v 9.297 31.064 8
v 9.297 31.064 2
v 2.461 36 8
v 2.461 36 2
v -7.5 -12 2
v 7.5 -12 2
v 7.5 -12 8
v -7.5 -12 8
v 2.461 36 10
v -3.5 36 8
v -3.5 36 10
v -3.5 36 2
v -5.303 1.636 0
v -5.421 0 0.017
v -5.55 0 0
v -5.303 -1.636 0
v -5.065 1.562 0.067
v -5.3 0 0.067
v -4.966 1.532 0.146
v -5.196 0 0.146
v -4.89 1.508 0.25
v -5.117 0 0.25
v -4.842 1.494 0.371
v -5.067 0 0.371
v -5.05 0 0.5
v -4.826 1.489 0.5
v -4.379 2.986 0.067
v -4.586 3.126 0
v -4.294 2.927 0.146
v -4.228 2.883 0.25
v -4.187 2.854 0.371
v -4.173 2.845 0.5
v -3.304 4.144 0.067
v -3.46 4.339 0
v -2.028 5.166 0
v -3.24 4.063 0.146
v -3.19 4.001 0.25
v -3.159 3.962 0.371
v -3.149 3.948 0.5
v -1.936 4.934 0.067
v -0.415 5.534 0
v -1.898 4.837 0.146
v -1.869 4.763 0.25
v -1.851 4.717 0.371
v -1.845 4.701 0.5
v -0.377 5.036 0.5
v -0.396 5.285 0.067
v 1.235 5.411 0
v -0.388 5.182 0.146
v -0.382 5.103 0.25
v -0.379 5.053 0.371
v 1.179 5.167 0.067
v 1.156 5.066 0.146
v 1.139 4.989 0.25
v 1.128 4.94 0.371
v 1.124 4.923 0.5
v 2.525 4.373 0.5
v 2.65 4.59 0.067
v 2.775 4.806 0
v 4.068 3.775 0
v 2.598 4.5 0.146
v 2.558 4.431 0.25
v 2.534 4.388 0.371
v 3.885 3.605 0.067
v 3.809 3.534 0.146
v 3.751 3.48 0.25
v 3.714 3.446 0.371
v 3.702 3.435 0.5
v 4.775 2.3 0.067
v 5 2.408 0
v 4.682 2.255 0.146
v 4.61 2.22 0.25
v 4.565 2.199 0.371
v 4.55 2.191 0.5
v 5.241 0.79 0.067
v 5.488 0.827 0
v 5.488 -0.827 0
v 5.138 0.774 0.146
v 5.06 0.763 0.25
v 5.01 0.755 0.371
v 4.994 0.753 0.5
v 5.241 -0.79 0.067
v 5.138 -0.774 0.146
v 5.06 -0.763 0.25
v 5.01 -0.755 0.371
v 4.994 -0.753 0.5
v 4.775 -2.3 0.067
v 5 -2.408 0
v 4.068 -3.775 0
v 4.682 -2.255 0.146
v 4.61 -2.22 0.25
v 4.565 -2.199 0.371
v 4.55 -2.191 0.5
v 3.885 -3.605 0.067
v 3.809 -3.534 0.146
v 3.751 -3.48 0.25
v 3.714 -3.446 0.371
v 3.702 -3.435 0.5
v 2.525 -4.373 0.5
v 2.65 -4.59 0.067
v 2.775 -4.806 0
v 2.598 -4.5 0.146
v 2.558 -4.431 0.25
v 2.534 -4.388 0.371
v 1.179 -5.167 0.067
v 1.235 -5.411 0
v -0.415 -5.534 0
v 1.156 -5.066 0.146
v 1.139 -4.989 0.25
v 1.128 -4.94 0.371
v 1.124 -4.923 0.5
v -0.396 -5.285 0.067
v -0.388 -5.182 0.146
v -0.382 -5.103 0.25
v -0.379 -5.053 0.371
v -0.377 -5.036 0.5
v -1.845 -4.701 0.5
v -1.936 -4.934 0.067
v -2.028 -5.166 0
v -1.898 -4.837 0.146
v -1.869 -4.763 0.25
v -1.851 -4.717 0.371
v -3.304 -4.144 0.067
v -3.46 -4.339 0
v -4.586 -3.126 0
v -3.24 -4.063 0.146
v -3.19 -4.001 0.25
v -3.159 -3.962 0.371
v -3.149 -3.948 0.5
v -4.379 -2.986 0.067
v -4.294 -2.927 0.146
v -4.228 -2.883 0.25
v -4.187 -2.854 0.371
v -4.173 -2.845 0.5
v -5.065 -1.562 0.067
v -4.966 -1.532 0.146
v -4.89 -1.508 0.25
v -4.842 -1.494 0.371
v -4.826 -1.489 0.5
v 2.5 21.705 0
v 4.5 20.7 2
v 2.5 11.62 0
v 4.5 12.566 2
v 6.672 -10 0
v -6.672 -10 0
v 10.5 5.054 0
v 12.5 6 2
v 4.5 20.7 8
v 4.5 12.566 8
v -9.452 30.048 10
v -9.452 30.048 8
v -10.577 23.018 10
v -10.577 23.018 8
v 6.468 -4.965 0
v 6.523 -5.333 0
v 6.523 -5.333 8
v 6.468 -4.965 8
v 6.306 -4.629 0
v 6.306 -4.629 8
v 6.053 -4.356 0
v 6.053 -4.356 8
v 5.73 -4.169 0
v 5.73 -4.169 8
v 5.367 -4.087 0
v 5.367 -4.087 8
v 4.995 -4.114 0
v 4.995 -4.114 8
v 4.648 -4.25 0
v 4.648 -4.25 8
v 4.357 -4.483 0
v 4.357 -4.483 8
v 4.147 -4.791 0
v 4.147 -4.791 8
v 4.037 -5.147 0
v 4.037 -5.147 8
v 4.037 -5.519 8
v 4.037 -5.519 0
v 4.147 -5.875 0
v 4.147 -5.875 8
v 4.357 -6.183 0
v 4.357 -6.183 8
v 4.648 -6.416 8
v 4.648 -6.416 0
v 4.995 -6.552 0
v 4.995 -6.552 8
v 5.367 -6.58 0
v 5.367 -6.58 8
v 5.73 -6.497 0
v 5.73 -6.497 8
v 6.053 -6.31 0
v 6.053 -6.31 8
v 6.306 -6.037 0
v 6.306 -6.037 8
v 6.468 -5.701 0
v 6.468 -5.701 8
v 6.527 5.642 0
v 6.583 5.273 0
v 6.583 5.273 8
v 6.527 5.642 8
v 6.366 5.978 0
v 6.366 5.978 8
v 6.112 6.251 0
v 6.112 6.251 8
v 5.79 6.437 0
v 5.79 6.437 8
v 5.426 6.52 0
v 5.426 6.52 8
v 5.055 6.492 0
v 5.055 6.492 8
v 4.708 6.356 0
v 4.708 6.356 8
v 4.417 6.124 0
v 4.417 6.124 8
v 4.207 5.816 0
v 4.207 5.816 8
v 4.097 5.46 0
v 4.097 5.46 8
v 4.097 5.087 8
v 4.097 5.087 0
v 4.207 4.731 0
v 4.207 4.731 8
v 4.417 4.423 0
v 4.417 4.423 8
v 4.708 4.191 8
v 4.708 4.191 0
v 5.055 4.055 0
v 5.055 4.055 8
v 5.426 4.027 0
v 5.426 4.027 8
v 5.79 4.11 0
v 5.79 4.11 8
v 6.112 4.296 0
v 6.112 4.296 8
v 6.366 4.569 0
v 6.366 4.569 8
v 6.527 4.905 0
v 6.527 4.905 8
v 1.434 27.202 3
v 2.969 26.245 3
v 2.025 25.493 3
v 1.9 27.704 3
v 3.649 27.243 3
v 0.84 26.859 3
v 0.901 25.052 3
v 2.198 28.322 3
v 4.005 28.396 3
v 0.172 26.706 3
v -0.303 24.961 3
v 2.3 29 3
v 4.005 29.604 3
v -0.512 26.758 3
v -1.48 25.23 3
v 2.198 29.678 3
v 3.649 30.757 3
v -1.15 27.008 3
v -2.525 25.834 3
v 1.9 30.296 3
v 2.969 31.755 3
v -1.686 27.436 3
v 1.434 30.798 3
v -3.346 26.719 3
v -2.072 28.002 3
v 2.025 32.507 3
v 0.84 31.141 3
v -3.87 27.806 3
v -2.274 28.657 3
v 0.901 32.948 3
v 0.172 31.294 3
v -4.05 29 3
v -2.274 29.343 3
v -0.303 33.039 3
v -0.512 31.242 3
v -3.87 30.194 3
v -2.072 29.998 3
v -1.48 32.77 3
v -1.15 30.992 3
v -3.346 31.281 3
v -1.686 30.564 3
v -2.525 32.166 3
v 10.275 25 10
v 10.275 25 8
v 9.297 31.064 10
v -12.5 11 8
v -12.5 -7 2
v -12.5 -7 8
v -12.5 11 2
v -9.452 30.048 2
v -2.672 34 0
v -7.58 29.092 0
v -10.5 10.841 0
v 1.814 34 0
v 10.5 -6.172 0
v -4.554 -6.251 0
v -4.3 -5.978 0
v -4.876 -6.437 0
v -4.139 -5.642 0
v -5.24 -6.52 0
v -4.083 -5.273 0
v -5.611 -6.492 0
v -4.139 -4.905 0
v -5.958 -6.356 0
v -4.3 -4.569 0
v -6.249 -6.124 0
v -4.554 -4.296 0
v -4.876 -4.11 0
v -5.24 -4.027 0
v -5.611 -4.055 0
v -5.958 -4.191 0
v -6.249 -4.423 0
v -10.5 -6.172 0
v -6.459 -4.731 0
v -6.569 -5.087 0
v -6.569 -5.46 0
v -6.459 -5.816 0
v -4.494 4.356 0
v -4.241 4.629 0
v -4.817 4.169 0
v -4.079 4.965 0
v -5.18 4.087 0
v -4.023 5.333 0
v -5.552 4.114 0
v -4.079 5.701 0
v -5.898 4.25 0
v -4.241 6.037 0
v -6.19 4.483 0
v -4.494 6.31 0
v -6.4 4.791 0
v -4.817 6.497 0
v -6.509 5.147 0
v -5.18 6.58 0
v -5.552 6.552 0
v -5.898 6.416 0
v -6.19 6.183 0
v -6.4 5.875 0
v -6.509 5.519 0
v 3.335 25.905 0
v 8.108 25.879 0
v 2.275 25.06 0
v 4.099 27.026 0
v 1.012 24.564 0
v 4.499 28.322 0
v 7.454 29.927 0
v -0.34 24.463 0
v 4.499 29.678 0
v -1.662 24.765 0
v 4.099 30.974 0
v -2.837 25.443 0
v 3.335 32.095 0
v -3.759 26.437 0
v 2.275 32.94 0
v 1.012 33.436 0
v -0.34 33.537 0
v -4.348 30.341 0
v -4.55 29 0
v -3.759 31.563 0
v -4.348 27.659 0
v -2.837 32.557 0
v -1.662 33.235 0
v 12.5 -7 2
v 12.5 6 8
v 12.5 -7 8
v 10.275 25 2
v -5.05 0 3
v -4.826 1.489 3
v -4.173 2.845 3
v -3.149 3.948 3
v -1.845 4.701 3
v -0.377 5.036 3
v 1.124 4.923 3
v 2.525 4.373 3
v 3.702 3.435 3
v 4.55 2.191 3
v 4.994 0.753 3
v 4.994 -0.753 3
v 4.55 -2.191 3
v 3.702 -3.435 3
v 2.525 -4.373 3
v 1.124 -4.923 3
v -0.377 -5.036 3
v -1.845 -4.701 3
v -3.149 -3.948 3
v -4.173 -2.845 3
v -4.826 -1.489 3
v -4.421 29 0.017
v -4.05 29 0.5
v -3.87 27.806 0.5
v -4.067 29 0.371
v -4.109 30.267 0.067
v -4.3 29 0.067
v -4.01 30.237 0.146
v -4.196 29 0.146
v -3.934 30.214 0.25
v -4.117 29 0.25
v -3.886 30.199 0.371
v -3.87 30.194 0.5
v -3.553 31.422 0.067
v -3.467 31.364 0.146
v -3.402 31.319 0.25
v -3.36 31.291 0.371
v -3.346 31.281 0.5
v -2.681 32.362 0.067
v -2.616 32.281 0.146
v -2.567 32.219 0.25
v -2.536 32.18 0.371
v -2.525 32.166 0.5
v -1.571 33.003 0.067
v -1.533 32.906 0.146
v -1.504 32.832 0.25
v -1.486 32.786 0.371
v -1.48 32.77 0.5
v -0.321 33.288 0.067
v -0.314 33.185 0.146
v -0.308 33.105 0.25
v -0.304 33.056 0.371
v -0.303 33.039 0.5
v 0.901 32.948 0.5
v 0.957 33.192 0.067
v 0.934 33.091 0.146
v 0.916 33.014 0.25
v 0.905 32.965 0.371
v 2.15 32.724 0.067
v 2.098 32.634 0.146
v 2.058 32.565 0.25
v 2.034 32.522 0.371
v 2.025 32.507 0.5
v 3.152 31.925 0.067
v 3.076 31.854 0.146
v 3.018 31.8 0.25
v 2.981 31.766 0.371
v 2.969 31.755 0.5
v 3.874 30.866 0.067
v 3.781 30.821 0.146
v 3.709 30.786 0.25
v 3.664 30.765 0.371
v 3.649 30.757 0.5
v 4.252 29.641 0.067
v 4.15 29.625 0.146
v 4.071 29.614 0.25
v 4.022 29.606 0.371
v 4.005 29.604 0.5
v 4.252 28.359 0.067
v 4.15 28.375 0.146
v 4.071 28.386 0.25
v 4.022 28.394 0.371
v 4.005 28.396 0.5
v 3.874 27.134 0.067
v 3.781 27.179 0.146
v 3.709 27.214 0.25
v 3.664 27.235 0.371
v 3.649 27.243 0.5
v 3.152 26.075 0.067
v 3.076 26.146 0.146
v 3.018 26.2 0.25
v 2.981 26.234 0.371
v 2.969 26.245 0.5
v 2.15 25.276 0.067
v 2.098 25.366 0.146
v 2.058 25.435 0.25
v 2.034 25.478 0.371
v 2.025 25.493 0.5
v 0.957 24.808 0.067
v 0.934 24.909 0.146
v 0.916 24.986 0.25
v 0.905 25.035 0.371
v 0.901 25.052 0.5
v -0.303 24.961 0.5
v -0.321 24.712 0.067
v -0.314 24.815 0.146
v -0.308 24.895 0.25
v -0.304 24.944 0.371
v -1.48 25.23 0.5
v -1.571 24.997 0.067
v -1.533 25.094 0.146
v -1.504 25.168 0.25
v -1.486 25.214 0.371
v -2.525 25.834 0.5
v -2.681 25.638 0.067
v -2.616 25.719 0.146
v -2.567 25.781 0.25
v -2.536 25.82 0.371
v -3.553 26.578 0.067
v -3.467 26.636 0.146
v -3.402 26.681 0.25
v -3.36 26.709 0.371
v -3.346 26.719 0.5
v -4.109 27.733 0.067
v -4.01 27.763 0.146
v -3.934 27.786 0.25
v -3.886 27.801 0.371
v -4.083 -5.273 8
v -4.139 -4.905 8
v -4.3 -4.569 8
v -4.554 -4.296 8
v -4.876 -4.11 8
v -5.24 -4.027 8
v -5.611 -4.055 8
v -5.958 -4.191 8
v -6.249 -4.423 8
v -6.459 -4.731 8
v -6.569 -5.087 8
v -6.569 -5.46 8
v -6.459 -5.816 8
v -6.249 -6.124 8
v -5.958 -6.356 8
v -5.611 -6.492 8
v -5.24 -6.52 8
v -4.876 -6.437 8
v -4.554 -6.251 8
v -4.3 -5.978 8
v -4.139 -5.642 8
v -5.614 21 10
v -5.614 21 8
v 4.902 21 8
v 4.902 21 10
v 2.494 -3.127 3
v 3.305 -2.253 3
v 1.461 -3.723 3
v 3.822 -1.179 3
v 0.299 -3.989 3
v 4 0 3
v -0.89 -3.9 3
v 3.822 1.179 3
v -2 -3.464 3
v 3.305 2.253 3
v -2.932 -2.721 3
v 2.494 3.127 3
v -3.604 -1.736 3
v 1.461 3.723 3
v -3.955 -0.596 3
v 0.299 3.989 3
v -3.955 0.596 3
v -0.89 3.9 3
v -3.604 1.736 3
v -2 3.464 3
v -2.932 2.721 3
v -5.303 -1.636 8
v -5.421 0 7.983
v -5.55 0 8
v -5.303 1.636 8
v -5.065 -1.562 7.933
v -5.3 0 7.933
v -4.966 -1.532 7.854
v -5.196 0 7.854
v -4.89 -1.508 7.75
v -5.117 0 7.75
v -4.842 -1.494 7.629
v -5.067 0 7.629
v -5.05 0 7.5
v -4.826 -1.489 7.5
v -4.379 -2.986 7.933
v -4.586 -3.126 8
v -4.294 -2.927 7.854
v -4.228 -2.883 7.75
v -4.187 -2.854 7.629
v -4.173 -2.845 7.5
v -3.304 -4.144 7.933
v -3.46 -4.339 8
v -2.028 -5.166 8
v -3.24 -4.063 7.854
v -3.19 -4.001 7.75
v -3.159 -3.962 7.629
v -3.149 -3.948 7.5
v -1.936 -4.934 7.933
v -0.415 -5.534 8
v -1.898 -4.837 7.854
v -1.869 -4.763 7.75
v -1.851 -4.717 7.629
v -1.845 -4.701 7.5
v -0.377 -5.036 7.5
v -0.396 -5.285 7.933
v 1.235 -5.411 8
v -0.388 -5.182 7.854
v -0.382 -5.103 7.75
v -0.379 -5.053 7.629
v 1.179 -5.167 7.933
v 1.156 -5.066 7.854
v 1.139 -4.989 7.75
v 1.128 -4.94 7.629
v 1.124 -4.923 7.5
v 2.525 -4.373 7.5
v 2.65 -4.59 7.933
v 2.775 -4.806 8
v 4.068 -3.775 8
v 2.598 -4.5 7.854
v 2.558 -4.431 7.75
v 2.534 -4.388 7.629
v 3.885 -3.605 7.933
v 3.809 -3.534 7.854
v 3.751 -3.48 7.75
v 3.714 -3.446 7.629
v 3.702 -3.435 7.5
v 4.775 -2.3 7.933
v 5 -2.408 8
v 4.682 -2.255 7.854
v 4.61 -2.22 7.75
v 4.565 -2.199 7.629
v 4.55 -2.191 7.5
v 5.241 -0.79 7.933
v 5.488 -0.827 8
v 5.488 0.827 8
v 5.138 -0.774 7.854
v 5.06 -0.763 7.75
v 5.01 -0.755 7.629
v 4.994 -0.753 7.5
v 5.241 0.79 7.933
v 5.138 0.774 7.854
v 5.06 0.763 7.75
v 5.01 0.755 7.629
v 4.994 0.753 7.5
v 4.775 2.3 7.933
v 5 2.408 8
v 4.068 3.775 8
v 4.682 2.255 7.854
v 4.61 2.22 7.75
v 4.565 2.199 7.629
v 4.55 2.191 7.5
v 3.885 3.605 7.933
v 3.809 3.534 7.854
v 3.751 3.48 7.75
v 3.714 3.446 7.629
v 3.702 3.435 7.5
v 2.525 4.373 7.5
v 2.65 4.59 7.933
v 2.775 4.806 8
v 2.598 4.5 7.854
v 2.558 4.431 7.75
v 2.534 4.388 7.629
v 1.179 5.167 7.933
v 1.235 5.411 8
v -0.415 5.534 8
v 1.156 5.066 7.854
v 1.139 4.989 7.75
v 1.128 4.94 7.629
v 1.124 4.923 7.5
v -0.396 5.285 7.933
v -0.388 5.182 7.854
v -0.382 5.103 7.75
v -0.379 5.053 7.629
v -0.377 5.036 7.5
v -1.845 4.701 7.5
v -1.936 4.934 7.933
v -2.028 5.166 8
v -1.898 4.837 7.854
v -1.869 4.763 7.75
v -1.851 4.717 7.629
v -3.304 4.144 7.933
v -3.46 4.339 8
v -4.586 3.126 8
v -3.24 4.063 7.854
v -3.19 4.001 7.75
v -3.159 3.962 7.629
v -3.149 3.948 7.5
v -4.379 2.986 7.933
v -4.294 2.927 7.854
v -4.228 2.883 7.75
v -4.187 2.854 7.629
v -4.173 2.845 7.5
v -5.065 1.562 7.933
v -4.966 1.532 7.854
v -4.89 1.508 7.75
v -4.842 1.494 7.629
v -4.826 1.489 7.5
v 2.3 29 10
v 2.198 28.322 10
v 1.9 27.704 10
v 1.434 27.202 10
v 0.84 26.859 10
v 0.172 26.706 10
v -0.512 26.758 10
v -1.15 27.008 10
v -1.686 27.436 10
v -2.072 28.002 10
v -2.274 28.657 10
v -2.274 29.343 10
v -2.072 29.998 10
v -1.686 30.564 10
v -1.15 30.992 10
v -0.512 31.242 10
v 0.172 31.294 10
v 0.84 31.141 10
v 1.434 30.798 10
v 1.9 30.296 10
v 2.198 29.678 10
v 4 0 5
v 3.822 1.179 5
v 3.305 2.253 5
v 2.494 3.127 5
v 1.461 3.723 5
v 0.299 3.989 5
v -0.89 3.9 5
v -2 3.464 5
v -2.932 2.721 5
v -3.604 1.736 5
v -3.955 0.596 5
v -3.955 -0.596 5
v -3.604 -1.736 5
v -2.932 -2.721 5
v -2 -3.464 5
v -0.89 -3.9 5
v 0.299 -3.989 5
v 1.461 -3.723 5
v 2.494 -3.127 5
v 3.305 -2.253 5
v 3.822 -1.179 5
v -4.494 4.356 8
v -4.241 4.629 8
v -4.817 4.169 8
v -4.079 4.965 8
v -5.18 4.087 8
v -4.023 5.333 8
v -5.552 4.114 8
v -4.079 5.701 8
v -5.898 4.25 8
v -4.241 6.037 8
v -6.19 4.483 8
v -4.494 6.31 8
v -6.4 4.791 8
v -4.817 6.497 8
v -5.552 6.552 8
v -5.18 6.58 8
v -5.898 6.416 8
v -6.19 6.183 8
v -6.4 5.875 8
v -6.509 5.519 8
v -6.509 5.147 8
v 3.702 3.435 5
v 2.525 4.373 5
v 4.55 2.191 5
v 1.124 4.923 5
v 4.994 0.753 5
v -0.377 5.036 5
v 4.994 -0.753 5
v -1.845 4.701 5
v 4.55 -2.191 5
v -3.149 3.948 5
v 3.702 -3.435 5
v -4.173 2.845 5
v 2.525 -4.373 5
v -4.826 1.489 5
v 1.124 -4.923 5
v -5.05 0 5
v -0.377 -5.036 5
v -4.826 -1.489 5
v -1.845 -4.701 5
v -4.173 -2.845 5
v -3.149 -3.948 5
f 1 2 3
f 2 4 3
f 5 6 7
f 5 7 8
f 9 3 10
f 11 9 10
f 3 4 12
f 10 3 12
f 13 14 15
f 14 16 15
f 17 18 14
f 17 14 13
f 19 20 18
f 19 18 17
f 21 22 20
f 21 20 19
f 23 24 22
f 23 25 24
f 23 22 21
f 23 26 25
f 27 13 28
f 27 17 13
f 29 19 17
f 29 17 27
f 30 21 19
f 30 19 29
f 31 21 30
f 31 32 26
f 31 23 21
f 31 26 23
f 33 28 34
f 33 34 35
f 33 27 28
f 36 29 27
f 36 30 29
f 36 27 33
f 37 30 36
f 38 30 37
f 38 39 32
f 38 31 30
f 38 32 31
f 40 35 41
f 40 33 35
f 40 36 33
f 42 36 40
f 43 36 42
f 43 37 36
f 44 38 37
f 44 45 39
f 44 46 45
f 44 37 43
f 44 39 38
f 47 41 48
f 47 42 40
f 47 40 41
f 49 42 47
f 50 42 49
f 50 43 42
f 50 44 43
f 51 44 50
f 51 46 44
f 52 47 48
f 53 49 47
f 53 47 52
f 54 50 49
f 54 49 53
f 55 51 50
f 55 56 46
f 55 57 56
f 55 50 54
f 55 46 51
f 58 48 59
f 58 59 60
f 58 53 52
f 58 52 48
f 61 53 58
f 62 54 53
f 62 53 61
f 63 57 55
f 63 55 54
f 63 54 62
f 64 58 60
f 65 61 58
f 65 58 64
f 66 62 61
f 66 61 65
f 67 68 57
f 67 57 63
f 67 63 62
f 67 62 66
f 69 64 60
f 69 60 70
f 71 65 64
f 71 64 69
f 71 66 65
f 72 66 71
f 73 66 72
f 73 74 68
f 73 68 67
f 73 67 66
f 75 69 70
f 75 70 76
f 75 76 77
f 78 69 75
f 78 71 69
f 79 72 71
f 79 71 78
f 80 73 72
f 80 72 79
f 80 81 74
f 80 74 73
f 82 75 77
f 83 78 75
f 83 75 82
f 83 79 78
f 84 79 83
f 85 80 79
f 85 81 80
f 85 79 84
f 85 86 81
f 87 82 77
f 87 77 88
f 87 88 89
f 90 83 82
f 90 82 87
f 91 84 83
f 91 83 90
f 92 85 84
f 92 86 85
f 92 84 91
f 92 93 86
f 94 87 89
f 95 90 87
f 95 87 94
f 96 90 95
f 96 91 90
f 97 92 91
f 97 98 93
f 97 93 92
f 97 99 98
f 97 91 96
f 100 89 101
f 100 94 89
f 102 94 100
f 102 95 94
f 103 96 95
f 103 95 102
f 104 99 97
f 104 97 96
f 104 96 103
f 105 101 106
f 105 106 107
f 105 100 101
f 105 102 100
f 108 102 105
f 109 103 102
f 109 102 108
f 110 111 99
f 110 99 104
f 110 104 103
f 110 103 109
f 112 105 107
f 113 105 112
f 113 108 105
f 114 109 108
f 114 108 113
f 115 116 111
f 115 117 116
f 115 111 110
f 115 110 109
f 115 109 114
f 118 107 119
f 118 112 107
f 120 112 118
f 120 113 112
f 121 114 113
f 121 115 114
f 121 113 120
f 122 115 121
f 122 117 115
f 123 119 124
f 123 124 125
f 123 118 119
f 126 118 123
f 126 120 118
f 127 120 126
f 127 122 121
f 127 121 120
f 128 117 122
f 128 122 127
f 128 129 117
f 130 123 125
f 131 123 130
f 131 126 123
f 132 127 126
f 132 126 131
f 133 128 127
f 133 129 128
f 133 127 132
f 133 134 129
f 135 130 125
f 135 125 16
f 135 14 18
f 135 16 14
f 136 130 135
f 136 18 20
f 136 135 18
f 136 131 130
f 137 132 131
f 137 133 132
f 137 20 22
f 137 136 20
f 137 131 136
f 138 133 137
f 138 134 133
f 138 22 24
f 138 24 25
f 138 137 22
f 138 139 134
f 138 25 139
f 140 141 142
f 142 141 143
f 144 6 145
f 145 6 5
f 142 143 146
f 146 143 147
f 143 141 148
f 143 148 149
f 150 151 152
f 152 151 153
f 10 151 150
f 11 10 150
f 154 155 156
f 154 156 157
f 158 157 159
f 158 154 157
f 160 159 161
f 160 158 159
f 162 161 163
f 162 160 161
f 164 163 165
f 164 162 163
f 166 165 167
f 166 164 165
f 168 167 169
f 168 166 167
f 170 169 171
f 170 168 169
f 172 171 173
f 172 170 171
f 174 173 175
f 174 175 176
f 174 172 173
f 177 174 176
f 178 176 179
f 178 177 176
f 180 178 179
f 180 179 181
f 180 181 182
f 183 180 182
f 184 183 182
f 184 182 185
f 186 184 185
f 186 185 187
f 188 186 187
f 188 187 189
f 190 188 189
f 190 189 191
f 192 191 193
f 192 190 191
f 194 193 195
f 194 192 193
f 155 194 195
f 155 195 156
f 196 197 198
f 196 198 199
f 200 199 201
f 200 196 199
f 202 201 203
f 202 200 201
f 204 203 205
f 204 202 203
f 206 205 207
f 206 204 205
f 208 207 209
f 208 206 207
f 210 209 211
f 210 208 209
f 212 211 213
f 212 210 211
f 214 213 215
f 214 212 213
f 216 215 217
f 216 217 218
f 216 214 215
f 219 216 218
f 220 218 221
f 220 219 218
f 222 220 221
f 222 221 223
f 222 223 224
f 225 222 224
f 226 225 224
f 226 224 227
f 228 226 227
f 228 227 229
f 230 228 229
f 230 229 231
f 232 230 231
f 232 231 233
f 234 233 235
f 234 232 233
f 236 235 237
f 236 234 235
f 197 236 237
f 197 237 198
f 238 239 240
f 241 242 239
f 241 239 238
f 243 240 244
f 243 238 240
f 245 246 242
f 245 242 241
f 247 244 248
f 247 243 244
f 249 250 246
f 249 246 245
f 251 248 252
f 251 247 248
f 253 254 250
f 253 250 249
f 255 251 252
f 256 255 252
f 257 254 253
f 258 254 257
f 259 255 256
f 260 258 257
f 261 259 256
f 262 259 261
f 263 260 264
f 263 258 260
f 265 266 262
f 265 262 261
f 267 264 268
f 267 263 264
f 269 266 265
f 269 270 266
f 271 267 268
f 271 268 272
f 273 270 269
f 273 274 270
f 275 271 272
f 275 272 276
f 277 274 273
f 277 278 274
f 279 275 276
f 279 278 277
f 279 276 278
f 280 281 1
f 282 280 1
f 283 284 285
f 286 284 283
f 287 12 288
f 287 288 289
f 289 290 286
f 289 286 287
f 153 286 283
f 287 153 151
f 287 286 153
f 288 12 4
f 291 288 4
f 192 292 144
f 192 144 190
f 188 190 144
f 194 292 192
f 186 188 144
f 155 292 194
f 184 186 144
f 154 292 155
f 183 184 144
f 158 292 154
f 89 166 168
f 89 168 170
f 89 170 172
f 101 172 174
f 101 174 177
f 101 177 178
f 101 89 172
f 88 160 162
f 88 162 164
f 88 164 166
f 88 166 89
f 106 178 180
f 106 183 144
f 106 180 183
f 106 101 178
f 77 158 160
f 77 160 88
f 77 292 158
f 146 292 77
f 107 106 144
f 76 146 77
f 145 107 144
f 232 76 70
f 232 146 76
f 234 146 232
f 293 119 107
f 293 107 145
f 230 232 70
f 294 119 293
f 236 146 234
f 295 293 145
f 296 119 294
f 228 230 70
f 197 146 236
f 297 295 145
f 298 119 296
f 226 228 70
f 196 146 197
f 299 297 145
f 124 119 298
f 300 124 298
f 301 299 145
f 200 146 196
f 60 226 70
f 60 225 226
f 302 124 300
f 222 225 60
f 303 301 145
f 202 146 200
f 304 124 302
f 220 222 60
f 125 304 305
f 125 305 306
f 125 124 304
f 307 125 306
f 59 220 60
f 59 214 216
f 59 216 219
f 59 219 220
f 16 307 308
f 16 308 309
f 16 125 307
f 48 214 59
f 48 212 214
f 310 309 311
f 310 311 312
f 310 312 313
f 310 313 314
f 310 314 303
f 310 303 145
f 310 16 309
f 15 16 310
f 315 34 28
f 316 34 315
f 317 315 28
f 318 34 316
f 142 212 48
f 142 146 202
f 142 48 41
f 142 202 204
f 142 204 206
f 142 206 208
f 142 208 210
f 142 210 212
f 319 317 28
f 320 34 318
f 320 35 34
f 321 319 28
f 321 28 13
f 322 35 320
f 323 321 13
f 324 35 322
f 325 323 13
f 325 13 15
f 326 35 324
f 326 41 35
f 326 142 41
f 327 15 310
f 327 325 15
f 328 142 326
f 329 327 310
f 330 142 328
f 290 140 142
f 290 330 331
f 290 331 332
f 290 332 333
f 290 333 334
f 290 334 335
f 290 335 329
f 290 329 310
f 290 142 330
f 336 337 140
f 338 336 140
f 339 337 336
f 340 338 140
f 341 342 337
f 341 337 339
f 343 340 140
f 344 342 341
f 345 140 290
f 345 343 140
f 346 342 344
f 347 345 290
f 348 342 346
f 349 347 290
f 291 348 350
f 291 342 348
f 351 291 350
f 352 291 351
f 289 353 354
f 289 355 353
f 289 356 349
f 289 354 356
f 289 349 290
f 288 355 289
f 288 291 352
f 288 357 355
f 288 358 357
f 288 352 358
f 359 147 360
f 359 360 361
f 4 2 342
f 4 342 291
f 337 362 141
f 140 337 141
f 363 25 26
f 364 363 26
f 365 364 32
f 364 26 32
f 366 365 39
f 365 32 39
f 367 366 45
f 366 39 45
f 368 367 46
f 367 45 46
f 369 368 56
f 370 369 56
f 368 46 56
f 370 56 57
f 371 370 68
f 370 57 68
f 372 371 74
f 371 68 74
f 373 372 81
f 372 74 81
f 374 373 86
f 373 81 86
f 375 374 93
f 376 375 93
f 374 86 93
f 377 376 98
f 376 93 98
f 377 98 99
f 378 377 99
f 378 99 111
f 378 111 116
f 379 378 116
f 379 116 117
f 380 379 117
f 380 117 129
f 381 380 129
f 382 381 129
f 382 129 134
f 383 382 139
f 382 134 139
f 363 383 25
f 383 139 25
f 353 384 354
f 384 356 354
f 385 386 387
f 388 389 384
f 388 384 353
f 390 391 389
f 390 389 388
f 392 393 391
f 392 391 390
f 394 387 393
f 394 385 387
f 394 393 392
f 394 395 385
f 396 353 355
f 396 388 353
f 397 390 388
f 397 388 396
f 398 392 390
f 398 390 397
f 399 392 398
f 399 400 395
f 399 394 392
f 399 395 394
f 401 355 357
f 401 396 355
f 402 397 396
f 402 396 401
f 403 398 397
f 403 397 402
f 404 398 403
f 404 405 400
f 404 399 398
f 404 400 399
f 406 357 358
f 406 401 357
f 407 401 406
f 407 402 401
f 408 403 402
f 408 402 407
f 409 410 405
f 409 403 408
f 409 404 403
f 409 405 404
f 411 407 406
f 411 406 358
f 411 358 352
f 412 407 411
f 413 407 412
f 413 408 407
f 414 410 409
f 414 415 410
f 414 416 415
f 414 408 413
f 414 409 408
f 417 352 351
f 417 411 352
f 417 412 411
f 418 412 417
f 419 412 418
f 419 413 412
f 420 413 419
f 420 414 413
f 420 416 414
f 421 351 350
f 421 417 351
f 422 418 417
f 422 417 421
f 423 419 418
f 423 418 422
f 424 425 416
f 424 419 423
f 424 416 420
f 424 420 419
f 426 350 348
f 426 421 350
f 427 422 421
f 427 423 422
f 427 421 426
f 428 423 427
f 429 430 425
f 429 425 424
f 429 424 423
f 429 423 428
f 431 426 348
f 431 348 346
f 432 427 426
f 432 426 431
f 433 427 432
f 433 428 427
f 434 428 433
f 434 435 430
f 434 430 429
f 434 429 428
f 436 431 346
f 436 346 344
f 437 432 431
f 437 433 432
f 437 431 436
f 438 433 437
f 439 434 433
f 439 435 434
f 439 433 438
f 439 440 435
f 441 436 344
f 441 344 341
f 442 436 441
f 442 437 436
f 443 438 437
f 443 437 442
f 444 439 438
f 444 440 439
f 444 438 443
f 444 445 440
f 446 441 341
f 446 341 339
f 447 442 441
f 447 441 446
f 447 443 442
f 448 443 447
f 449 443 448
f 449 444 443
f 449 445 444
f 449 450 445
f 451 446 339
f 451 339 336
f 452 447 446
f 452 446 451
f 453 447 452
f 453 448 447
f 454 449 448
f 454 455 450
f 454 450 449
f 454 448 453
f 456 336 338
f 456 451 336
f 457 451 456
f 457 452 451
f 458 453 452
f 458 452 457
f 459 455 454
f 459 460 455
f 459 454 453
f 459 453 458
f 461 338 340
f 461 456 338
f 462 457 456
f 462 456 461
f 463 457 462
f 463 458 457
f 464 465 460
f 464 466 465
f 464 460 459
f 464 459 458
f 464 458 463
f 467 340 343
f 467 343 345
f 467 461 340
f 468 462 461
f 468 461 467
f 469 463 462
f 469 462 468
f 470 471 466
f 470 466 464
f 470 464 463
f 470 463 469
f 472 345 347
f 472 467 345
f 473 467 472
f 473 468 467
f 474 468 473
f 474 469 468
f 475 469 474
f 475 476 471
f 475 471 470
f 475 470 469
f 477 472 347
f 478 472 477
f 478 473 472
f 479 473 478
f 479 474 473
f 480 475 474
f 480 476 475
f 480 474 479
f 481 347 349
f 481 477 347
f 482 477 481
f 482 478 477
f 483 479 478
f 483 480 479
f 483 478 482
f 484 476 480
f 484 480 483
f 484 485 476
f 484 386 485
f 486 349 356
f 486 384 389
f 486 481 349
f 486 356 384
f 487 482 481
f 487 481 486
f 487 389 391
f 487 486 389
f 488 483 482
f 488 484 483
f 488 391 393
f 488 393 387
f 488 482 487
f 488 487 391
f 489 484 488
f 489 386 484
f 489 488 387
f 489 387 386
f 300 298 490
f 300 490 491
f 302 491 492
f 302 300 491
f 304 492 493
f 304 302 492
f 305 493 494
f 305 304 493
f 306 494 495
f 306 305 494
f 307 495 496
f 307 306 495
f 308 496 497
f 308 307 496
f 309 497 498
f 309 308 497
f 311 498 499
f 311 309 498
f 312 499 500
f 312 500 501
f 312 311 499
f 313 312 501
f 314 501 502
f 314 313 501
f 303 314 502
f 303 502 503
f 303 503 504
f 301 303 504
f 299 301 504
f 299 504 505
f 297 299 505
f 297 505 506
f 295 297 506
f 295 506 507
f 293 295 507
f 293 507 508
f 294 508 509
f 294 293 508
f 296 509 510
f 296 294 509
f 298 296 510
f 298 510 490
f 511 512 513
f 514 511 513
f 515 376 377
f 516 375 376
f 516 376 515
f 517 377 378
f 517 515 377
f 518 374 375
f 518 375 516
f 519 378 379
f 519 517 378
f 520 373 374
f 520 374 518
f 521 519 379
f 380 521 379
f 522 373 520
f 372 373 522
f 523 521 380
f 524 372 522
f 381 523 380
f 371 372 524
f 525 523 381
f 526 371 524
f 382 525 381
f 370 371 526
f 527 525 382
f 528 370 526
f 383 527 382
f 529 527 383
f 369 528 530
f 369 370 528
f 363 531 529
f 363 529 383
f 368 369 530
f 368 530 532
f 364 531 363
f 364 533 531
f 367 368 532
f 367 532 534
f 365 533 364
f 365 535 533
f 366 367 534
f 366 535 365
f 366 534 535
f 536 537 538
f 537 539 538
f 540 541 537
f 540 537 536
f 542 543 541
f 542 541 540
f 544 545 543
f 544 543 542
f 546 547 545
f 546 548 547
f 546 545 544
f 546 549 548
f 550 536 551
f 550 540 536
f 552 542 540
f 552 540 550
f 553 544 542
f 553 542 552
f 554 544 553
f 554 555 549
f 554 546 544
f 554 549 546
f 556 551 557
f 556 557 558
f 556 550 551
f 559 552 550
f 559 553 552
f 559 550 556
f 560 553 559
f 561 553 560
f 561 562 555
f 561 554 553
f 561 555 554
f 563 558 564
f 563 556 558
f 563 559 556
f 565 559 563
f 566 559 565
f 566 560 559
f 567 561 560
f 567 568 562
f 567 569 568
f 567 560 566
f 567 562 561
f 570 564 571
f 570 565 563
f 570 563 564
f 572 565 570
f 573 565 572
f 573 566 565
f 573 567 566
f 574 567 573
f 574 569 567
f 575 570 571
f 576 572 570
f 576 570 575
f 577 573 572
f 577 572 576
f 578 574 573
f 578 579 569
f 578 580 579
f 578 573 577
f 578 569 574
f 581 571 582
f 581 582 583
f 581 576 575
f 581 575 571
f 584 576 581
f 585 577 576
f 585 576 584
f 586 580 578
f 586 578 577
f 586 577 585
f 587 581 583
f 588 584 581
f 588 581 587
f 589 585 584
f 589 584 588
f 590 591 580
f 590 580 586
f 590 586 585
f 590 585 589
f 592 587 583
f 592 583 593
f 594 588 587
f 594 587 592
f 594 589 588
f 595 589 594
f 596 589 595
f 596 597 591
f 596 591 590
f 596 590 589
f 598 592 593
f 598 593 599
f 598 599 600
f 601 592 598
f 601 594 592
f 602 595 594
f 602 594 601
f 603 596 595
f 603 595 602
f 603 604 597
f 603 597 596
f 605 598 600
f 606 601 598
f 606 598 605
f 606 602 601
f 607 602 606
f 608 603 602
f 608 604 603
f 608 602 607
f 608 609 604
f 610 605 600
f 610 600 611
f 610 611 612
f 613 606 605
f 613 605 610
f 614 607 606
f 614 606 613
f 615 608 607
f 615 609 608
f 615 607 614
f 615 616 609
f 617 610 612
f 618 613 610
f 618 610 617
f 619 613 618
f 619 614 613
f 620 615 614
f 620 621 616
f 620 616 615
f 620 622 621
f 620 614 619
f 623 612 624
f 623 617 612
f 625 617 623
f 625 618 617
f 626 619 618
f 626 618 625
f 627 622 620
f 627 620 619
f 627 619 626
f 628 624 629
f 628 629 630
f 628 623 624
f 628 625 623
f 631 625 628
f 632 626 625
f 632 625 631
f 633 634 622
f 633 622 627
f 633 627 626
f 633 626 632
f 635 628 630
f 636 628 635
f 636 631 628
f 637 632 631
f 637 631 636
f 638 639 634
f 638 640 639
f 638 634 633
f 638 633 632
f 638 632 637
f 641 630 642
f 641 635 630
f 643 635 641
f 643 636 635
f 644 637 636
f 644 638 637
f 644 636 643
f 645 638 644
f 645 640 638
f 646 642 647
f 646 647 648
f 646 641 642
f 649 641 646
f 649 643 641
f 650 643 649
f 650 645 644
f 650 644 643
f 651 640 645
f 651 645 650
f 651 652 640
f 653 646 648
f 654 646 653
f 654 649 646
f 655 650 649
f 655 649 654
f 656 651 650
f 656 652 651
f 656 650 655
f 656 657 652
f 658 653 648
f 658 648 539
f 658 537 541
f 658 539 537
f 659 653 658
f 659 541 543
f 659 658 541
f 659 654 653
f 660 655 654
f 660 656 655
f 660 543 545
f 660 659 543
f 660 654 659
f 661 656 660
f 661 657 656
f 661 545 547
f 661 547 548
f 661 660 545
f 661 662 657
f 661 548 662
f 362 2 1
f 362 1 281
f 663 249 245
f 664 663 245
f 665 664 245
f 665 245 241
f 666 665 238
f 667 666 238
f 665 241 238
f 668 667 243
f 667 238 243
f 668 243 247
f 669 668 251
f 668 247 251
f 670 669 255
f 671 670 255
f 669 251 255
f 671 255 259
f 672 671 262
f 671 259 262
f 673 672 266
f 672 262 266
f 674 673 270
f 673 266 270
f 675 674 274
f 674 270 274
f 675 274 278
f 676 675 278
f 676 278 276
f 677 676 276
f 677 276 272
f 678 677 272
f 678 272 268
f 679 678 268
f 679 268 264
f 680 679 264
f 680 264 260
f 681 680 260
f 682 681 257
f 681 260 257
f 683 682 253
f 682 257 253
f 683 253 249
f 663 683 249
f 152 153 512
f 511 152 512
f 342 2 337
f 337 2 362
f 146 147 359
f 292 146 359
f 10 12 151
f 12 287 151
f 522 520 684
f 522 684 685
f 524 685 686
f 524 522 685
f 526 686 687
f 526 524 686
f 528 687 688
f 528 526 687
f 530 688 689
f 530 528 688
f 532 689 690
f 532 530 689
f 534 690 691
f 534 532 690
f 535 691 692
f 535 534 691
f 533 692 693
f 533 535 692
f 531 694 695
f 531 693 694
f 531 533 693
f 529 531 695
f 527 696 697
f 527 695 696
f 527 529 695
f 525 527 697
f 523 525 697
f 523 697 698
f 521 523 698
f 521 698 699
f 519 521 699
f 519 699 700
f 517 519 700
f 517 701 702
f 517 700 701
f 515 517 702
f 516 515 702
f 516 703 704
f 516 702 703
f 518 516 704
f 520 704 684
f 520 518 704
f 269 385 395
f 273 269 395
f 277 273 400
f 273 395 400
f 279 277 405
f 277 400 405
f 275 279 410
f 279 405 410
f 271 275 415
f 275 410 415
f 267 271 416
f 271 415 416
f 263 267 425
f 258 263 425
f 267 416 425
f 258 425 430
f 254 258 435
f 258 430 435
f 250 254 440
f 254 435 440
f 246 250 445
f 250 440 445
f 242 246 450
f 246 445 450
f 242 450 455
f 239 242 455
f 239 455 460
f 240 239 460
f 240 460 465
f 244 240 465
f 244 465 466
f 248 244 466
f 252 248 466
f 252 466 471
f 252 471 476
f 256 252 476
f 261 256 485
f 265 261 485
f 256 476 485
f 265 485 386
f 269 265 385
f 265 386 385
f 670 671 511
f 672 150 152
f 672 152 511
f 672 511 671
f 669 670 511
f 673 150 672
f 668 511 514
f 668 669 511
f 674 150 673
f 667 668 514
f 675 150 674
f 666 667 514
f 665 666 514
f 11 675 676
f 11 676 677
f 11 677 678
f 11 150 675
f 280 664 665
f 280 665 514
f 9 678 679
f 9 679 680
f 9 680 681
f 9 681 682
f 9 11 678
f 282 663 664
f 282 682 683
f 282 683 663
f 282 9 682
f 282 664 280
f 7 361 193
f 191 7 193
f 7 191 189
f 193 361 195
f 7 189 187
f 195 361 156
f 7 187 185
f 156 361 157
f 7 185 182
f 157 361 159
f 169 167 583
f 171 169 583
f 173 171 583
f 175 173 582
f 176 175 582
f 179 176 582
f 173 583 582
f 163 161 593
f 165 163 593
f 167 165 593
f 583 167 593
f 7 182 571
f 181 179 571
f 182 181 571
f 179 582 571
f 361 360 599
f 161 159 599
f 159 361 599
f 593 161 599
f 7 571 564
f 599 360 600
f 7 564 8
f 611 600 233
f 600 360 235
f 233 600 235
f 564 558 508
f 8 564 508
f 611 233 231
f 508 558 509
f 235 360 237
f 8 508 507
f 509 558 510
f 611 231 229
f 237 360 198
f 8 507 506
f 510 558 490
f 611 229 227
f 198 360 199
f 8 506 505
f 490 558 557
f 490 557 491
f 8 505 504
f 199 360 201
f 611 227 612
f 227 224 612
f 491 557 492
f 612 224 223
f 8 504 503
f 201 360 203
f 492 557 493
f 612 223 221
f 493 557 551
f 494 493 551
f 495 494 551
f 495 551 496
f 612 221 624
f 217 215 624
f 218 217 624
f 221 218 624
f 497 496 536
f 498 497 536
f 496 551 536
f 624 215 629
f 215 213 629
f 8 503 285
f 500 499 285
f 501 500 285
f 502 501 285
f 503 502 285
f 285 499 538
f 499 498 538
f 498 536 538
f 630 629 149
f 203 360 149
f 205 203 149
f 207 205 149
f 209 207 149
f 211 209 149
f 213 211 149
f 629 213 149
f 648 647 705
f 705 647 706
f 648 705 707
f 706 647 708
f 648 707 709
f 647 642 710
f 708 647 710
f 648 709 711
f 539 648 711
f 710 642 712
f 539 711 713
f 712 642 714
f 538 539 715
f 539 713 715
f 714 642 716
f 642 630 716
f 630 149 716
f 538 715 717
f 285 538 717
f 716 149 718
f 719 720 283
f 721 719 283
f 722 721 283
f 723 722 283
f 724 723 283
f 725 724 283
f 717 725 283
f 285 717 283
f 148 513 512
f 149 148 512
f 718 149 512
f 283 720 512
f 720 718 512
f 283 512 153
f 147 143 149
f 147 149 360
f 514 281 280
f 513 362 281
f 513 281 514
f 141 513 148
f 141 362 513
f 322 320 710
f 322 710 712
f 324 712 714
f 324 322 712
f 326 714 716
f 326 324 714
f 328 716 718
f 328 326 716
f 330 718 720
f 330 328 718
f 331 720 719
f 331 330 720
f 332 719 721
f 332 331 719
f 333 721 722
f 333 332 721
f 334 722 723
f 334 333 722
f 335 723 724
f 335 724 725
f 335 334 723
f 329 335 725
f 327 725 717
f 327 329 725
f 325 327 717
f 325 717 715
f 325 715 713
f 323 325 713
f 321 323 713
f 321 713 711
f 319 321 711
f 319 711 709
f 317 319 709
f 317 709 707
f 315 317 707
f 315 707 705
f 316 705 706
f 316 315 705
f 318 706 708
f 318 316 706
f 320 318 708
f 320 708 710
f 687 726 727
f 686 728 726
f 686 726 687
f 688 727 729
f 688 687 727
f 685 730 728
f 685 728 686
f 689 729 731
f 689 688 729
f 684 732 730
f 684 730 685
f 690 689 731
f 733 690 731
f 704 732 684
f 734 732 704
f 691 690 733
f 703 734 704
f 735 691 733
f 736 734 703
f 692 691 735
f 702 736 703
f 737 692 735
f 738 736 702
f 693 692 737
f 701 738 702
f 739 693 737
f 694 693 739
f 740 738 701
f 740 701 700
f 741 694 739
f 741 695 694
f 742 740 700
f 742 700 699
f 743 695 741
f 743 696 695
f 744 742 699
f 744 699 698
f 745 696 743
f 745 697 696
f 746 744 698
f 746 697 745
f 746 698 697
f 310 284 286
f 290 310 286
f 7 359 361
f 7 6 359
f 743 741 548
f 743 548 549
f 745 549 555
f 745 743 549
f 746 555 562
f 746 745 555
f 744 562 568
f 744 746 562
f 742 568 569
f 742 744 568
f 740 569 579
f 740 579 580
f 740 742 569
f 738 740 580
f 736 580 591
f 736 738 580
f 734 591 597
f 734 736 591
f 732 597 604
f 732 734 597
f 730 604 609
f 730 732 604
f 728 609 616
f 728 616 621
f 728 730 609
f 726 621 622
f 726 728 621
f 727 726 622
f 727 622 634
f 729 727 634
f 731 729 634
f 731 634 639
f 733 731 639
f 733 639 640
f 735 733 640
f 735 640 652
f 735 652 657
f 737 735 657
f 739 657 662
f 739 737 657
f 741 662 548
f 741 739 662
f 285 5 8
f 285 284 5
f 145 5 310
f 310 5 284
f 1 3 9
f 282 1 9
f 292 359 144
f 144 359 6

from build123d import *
from OCP.BRepFilletAPI import BRepFilletAPI_MakeChamfer

# Parameters (mm, degrees)
SKETCH_1_R          = 1.25
SKETCH_1_R_2        = 4
SKETCH_1_R_3        = 2.3
EXTRUDE_2_DEPTH     = 8
CHAMFER_1_SIZE      = 5
EXTRUDE_3_DEPTH     = 2
SKETCH_3_R          = 2.3
CUT_EXTRUDE_1_DEPTH = 7
CUT_EXTRUDE_2_DEPTH = 10
CHAMFER_2_SIZE      = 5
CHAMFER_2_SIZE2     = 6.028089953
CHAMFER_2_SIZE2_2   = 6.039479554
CHAMFER_3_SIZE      = 2
SKETCH_5_R          = 5.05
CUT_EXTRUDE_3_DEPTH = 3
CUT_EXTRUDE_START   = -3
SKETCH_6_R          = 5.05
CUT_EXTRUDE_4_DEPTH = 3
FILLET_1_R          = 0.5
SKETCH_7_R          = 4.05
CUT_EXTRUDE_5_DEPTH = 3
FILLET_2_R          = 0.5


with BuildPart() as part:
    # 草图1 → 凸台-拉伸2 (new body)
    with BuildSketch(Plane.XY):
        Polygon((8.5, 36), (12.5, 11.216882722), (12.5, -12), (-12.5, -12), (-12.5, 11), (-8.5, 36), align=None)
        with Locations((-5.273420283, 5.333014019)):
            Circle(SKETCH_1_R, mode=Mode.SUBTRACT)
        with Locations((5.333014019, 5.273420283)):
            Circle(SKETCH_1_R, mode=Mode.SUBTRACT)
        with Locations((5.273420283, -5.333014019)):
            Circle(SKETCH_1_R, mode=Mode.SUBTRACT)
        with Locations((-5.333014019, -5.273420283)):
            Circle(SKETCH_1_R, mode=Mode.SUBTRACT)
        Circle(SKETCH_1_R_2, mode=Mode.SUBTRACT)
        with Locations((0, 29)):
            Circle(SKETCH_1_R_3, mode=Mode.SUBTRACT)
    extrude(amount=EXTRUDE_2_DEPTH)

    # 倒角1
    chamfer_1_edges = [part.edges().sort_by_distance(p)[0] for p in [
        (12.5, -12, 4),
        (-12.5, -12, 4),
    ]]
    chamfer(chamfer_1_edges, length=CHAMFER_1_SIZE)

    # 草图2 → 凸台-拉伸3 (add)
    with BuildSketch(Plane.XY.offset(8)):
        Polygon((-10.577137485, 23.017890722), (-5.61376382, 21), (5.631941325, 21), (10.595314989, 23.017890722), (8.5, 36), (-8.5, 36), align=None)
    extrude(amount=EXTRUDE_3_DEPTH)

    # 草图3 → 切除-拉伸1 (cut)
    with BuildSketch(Plane(origin=(0, 0, 8), x_dir=(-1, 0, 0), z_dir=(0, 0, -1))):
        with Locations(Location((0, 29, 0), (0, 0, 180))):
            Circle(SKETCH_3_R)
    extrude(amount=-CUT_EXTRUDE_1_DEPTH, mode=Mode.SUBTRACT)

    # 草图4 → 切除-拉伸2 (cut)
    with BuildSketch(Plane(origin=(0, 0, 0), x_dir=(-1, 0, 0), z_dir=(0, 0, -1))):
        Polygon((-10.275402162, 25), (-4.5, 20.700412405), (-4.5, 12.565758544), (-12.5, 6), (-12.5, 11.216882722), align=None)
    extrude(amount=-CUT_EXTRUDE_2_DEPTH, mode=Mode.SUBTRACT)

    # 倒角2: one chamfer whose edges measure the first distance from different faces: ONE call of the kernel's chamfer builder (chamfer() names one face for all edges)
    chamfer_2_edges_1 = [part.edges().sort_by_distance(p)[0] for p in [
        (-8.5, 36, 5),
    ]]
    chamfer_2_side_1 = [part.faces().sort_by_distance(p)[0] for p in [
        (0, 36, 5),
    ]]
    chamfer_2_edges_2 = [part.edges().sort_by_distance(p)[0] for p in [
        (8.5, 36, 5),
    ]]
    chamfer_2_side_2 = [part.faces().sort_by_distance(p)[0] for p in [
        (9.387701081, 30.5, 5),
    ]]
    chamfer_2 = BRepFilletAPI_MakeChamfer(part.part.solid().wrapped)
    for e in chamfer_2_edges_1:
        chamfer_2.Add(CHAMFER_2_SIZE, CHAMFER_2_SIZE2, e.wrapped, chamfer_2_side_1[0].wrapped)  # the first distance lies on this face
    for e in chamfer_2_edges_2:
        chamfer_2.Add(CHAMFER_2_SIZE, CHAMFER_2_SIZE2_2, e.wrapped, chamfer_2_side_2[0].wrapped)  # the first distance lies on this face
    add(Compound.cast(chamfer_2.Shape()), mode=Mode.REPLACE)

    # 倒角3
    chamfer_3_edges = [part.edges().sort_by_distance(p)[0] for p in [
        (-0.519739777, 36, 0),
        (-10.976190476, 20.523809524, 0),
        (-6.476190476, 33.023809524, 0),
        (5.878605618, 33.531939841, 0),
        (0, -12, 0),
        (12.5, -0.5, 0),
        (10, -9.5, 0),
        (-10, -9.5, 0),
        (9.786046476, 28.031939841, 0),
        (-12.5, 2, 0),
        (8.5, 9.282879272, 0),
        (4.5, 16.633085475, 0),
        (7.387701081, 22.850206203, 0),
    ]]
    chamfer(chamfer_3_edges, length=CHAMFER_3_SIZE)

    # 草图5 → 切除-拉伸3 (cut)
    with BuildSketch(Plane(origin=(0, 0, 0), x_dir=(-1, 0, 0), z_dir=(0, 0, -1))):
        Circle(SKETCH_5_R)
    extrude(amount=-CUT_EXTRUDE_3_DEPTH, mode=Mode.SUBTRACT)

    # 草图6 → 切除-拉伸4 (cut)
    with BuildSketch(Plane.XY.offset(8).offset(CUT_EXTRUDE_START)):
        with Locations(Location((0, 0, 0), (0, 0, 180))):
            Circle(SKETCH_6_R)
    extrude(amount=CUT_EXTRUDE_4_DEPTH, mode=Mode.SUBTRACT)

    # 圆角1
    fillet_1_edges = [part.edges().sort_by_distance(p)[0] for p in [
        (5.05, 0, 0),
        (5.05, 0, 8),
    ]]
    fillet(fillet_1_edges, radius=FILLET_1_R)

    # 草图7 → 切除-拉伸5 (cut)
    with BuildSketch(Plane(origin=(0, 0, 0), x_dir=(-1, 0, 0), z_dir=(0, 0, -1))):
        with Locations((0, 29)):
            Circle(SKETCH_7_R)
    extrude(amount=-CUT_EXTRUDE_5_DEPTH, mode=Mode.SUBTRACT)

    # 圆角2
    fillet_2_edges = [part.edges().sort_by_distance(p)[0] for p in [
        (4.05, 29, 0),
    ]]
    fillet(fillet_2_edges, radius=FILLET_2_R)


solid = part.part
